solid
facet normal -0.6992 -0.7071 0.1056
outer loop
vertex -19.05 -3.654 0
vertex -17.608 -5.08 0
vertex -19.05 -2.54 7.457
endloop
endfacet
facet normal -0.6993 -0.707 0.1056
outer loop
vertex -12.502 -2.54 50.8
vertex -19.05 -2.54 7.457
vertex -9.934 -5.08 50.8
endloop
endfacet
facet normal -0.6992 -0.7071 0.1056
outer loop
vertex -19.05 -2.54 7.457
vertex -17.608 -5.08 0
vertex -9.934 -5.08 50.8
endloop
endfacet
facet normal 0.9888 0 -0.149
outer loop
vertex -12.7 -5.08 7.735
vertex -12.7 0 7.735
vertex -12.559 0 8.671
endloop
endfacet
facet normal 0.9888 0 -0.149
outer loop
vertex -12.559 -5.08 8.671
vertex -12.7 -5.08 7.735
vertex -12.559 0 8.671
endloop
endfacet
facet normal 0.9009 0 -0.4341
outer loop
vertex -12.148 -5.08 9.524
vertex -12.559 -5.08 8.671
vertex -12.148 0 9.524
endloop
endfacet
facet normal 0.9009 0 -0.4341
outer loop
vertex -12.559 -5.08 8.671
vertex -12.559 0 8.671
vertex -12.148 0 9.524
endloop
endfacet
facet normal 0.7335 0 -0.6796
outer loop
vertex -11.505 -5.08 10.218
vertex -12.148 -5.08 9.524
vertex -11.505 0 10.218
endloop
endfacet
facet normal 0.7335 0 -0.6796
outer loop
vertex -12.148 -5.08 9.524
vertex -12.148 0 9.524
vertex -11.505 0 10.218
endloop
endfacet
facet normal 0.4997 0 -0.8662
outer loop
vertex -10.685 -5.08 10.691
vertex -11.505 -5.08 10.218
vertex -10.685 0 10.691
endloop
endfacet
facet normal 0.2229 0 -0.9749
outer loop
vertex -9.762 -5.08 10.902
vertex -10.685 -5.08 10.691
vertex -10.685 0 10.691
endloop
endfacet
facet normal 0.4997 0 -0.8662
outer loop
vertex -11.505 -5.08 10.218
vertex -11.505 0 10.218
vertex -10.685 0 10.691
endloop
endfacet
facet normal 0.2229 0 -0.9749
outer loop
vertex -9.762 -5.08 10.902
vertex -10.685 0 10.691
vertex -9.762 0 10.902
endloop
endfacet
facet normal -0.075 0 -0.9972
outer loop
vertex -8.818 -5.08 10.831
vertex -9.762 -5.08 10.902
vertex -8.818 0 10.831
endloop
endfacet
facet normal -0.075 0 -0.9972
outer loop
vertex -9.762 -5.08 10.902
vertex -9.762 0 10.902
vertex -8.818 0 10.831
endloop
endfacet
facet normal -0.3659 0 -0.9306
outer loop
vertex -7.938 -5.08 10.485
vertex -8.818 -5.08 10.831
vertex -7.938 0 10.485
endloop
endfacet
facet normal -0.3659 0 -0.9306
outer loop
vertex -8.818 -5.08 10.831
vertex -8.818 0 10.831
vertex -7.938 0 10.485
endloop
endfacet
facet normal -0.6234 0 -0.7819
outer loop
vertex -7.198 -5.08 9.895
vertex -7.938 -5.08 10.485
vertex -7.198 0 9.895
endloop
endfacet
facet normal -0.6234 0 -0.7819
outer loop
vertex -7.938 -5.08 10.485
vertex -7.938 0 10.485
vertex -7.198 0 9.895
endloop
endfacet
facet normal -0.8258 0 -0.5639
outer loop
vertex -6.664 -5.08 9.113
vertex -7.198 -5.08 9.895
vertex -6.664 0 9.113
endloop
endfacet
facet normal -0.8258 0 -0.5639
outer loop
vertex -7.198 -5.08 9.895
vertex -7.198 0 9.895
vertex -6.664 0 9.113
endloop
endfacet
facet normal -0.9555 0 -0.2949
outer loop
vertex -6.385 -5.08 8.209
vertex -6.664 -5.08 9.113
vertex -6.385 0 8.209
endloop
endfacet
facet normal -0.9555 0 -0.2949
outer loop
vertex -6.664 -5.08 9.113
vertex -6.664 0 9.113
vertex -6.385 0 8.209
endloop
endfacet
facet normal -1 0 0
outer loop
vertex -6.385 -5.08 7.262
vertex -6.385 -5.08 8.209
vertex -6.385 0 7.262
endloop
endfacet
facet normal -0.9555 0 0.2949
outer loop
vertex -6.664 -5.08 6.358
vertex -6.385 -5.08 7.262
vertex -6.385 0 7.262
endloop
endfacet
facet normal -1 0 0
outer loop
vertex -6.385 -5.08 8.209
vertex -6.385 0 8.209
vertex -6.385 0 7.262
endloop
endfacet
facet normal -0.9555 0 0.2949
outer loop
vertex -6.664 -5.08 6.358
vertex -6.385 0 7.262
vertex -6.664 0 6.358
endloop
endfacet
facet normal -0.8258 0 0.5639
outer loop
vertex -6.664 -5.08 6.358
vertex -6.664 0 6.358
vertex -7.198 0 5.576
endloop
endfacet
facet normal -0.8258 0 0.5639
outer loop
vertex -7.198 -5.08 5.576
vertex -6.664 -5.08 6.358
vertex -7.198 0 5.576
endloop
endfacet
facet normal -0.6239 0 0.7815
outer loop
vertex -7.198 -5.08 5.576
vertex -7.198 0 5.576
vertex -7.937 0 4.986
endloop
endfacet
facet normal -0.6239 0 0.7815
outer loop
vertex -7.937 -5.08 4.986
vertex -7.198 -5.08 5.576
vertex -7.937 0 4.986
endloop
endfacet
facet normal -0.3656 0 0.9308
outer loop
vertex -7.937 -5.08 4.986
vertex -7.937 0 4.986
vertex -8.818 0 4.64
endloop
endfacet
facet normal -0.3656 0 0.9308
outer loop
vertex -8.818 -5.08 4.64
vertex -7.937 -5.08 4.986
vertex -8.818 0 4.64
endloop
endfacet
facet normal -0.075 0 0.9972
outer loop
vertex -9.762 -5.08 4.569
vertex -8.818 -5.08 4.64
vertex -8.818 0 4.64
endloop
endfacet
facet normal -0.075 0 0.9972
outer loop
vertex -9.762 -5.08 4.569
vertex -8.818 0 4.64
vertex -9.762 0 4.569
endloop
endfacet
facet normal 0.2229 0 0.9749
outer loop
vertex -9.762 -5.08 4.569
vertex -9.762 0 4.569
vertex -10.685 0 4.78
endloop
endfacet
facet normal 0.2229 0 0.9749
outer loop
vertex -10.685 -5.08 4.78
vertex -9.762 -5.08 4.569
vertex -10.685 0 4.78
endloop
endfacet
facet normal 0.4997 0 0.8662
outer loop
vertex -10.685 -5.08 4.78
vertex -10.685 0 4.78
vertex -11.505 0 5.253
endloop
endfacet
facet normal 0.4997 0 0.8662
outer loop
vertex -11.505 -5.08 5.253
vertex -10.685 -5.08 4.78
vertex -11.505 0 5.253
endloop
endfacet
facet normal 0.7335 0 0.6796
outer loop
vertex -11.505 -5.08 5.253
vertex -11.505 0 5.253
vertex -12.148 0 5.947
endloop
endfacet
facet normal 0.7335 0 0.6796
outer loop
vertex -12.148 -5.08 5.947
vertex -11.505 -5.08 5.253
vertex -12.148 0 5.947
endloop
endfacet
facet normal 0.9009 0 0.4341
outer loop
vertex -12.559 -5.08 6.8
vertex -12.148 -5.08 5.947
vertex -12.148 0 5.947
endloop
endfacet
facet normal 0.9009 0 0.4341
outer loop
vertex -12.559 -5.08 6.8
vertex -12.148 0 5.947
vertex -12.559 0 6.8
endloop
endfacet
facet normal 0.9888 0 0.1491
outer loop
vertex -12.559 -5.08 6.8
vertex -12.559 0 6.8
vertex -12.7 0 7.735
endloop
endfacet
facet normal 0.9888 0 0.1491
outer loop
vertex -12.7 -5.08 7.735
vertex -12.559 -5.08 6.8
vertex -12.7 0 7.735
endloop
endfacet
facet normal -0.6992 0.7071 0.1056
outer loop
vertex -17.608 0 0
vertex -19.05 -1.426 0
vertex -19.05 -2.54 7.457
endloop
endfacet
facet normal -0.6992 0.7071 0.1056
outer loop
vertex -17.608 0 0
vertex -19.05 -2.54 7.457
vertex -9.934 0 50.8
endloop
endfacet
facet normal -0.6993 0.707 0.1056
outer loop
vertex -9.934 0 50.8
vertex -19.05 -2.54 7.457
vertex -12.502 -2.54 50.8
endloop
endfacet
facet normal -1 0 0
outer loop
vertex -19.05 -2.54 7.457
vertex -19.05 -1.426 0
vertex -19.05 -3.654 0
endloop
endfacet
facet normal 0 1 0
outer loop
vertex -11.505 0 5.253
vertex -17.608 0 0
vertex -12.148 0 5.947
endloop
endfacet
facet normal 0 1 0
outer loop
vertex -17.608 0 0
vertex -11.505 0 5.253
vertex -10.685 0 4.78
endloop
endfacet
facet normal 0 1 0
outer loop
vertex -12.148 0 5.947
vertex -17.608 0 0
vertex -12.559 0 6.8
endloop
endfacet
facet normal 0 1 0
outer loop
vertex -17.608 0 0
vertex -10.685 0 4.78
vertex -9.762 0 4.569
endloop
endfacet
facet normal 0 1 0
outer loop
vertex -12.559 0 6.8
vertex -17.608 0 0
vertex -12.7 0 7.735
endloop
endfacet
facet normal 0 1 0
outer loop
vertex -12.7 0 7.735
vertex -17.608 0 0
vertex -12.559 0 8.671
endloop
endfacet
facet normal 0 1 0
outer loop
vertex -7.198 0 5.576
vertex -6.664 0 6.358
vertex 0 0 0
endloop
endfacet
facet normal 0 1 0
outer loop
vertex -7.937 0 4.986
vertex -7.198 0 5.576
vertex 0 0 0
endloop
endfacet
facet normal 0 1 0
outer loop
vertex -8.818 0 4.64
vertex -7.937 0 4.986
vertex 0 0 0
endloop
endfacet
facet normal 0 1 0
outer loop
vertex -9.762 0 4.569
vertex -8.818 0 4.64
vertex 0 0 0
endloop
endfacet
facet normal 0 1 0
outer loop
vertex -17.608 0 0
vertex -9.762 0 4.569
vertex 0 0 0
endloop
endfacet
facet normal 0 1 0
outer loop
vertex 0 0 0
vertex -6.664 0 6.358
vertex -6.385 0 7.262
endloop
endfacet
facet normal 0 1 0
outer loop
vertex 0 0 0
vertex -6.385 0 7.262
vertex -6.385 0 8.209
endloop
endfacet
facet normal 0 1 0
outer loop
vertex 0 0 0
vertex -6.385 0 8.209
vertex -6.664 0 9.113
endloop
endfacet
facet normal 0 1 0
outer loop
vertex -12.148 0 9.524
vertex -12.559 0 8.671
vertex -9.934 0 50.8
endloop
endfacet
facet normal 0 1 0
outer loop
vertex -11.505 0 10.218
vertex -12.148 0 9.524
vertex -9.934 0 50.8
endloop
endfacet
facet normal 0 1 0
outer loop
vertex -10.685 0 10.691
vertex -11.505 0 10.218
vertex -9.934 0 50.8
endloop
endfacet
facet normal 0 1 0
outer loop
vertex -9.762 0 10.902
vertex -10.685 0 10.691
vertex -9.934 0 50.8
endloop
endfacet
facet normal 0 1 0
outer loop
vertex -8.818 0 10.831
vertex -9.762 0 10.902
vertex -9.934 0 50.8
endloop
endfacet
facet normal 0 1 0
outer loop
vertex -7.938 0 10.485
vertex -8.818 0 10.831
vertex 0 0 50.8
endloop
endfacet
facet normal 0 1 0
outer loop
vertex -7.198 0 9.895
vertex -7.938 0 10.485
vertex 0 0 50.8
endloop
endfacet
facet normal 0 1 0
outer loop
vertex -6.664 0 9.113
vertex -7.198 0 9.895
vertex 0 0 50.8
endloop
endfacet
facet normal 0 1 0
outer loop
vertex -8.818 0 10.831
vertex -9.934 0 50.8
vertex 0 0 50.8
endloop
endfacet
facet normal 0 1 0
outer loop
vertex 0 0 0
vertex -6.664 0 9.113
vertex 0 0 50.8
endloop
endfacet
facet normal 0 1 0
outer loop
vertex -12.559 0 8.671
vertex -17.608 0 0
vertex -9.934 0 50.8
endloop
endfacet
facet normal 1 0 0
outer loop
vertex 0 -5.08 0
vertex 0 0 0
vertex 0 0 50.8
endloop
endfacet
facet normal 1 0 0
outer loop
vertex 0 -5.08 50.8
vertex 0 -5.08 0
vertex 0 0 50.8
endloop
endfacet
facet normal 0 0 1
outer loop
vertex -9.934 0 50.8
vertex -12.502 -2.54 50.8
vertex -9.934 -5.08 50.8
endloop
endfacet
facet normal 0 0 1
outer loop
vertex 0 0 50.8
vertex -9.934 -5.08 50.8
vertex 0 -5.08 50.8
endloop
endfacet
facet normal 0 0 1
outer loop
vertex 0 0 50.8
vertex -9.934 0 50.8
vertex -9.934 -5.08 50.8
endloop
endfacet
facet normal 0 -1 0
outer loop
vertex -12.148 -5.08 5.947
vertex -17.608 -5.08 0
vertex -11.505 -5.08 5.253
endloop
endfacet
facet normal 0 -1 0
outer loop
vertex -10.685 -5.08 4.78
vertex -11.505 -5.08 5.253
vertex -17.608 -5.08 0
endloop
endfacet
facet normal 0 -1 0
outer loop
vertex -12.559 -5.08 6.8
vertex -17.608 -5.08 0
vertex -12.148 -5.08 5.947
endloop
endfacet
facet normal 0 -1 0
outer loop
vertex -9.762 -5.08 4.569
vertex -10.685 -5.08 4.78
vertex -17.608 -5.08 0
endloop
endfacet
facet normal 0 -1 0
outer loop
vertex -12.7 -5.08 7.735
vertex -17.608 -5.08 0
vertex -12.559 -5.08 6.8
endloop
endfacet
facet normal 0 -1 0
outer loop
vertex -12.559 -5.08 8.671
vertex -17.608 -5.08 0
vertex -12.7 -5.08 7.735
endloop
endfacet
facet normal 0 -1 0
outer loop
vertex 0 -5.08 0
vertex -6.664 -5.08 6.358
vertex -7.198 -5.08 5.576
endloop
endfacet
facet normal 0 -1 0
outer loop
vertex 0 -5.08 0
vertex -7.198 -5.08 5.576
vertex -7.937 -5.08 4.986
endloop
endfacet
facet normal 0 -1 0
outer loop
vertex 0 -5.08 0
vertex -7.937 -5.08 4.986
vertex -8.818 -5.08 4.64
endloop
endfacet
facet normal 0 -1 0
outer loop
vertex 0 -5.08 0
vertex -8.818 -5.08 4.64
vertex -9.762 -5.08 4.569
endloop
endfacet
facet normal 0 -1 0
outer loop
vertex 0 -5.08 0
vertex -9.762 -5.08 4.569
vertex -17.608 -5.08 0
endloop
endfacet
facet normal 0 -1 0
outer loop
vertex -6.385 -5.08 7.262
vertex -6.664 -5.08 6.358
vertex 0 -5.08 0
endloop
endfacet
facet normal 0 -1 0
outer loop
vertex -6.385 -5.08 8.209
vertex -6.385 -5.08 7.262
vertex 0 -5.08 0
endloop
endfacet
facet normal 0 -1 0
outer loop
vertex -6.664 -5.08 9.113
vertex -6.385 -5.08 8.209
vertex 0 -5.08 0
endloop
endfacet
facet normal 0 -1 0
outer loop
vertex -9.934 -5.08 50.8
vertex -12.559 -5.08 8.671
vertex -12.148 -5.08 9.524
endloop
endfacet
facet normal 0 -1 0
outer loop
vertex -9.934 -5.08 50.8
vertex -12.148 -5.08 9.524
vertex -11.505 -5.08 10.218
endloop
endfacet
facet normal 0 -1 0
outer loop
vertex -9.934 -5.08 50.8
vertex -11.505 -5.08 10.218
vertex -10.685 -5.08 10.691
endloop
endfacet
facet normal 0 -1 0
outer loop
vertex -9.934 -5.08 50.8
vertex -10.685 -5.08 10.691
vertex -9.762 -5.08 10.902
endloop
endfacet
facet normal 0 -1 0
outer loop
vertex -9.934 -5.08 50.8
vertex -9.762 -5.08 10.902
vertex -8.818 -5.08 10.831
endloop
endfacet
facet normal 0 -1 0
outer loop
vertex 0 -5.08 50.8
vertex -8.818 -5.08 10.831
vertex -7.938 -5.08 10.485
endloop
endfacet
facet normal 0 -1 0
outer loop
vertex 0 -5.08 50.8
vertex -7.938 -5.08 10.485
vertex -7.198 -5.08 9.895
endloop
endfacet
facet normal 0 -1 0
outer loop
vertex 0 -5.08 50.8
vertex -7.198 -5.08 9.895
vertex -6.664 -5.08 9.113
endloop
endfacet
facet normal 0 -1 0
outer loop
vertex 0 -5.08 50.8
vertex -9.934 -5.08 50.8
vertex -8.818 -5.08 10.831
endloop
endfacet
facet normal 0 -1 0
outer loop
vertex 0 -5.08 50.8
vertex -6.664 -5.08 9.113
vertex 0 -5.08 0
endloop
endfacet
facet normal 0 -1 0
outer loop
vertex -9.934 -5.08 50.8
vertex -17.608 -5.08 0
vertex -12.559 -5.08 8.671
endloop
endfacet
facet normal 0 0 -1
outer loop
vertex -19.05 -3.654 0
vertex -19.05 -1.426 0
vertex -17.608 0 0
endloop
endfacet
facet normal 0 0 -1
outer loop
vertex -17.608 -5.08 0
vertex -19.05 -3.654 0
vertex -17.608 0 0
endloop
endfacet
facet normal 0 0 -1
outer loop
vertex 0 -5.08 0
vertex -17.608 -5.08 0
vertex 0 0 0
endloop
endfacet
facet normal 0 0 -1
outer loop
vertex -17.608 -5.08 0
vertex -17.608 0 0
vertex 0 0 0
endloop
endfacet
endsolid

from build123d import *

# Parameters (mm, degrees)
F0_W     = 19.05
F0_H     = 50.8
F1_DEPTH = 5.08
F3_D     = 6.35
F5_DEPTH = 25.4
F6_SIZE  = 2.53999


# Not quite as in the source:
# - a fillet or chamfer is up to 0.001 mm smaller than in the source, because OpenCascade refuses the exact size


with BuildPart() as f1:
    # F0 (on Front) → F1 (new body)
    with BuildSketch(Plane.XZ):
        with Locations((-9.525, 25.4)):
            Rectangle(F0_W, F0_H)
    extrude(amount=F1_DEPTH)

    # F3 (through all)
    with Locations(Plane.XZ.offset(5.08)):
        with Locations((-9.525, 7.7354544774)):
            Hole(F3_D / 2)

    # F4 (on face) → F5 (cut)
    with BuildSketch(Plane.XZ.offset(5.08)):
        Polygon((-19.05, 7.4566449039), (-12.5023688375, 50.8), (-19.05, 50.8), align=None)
    extrude(amount=-F5_DEPTH, mode=Mode.SUBTRACT)

    # F6 (size 2.54 in the source; OpenCascade refuses exactly that, so slightly less here)
    f6_edges = [f1.edges().sort_by_distance(p)[0] for p in [
        (-15.776184, -5.08, 29.128322),
        (-15.776184, 0, 29.128322),
    ]]
    chamfer(f6_edges, length=F6_SIZE)


solid = f1.part
